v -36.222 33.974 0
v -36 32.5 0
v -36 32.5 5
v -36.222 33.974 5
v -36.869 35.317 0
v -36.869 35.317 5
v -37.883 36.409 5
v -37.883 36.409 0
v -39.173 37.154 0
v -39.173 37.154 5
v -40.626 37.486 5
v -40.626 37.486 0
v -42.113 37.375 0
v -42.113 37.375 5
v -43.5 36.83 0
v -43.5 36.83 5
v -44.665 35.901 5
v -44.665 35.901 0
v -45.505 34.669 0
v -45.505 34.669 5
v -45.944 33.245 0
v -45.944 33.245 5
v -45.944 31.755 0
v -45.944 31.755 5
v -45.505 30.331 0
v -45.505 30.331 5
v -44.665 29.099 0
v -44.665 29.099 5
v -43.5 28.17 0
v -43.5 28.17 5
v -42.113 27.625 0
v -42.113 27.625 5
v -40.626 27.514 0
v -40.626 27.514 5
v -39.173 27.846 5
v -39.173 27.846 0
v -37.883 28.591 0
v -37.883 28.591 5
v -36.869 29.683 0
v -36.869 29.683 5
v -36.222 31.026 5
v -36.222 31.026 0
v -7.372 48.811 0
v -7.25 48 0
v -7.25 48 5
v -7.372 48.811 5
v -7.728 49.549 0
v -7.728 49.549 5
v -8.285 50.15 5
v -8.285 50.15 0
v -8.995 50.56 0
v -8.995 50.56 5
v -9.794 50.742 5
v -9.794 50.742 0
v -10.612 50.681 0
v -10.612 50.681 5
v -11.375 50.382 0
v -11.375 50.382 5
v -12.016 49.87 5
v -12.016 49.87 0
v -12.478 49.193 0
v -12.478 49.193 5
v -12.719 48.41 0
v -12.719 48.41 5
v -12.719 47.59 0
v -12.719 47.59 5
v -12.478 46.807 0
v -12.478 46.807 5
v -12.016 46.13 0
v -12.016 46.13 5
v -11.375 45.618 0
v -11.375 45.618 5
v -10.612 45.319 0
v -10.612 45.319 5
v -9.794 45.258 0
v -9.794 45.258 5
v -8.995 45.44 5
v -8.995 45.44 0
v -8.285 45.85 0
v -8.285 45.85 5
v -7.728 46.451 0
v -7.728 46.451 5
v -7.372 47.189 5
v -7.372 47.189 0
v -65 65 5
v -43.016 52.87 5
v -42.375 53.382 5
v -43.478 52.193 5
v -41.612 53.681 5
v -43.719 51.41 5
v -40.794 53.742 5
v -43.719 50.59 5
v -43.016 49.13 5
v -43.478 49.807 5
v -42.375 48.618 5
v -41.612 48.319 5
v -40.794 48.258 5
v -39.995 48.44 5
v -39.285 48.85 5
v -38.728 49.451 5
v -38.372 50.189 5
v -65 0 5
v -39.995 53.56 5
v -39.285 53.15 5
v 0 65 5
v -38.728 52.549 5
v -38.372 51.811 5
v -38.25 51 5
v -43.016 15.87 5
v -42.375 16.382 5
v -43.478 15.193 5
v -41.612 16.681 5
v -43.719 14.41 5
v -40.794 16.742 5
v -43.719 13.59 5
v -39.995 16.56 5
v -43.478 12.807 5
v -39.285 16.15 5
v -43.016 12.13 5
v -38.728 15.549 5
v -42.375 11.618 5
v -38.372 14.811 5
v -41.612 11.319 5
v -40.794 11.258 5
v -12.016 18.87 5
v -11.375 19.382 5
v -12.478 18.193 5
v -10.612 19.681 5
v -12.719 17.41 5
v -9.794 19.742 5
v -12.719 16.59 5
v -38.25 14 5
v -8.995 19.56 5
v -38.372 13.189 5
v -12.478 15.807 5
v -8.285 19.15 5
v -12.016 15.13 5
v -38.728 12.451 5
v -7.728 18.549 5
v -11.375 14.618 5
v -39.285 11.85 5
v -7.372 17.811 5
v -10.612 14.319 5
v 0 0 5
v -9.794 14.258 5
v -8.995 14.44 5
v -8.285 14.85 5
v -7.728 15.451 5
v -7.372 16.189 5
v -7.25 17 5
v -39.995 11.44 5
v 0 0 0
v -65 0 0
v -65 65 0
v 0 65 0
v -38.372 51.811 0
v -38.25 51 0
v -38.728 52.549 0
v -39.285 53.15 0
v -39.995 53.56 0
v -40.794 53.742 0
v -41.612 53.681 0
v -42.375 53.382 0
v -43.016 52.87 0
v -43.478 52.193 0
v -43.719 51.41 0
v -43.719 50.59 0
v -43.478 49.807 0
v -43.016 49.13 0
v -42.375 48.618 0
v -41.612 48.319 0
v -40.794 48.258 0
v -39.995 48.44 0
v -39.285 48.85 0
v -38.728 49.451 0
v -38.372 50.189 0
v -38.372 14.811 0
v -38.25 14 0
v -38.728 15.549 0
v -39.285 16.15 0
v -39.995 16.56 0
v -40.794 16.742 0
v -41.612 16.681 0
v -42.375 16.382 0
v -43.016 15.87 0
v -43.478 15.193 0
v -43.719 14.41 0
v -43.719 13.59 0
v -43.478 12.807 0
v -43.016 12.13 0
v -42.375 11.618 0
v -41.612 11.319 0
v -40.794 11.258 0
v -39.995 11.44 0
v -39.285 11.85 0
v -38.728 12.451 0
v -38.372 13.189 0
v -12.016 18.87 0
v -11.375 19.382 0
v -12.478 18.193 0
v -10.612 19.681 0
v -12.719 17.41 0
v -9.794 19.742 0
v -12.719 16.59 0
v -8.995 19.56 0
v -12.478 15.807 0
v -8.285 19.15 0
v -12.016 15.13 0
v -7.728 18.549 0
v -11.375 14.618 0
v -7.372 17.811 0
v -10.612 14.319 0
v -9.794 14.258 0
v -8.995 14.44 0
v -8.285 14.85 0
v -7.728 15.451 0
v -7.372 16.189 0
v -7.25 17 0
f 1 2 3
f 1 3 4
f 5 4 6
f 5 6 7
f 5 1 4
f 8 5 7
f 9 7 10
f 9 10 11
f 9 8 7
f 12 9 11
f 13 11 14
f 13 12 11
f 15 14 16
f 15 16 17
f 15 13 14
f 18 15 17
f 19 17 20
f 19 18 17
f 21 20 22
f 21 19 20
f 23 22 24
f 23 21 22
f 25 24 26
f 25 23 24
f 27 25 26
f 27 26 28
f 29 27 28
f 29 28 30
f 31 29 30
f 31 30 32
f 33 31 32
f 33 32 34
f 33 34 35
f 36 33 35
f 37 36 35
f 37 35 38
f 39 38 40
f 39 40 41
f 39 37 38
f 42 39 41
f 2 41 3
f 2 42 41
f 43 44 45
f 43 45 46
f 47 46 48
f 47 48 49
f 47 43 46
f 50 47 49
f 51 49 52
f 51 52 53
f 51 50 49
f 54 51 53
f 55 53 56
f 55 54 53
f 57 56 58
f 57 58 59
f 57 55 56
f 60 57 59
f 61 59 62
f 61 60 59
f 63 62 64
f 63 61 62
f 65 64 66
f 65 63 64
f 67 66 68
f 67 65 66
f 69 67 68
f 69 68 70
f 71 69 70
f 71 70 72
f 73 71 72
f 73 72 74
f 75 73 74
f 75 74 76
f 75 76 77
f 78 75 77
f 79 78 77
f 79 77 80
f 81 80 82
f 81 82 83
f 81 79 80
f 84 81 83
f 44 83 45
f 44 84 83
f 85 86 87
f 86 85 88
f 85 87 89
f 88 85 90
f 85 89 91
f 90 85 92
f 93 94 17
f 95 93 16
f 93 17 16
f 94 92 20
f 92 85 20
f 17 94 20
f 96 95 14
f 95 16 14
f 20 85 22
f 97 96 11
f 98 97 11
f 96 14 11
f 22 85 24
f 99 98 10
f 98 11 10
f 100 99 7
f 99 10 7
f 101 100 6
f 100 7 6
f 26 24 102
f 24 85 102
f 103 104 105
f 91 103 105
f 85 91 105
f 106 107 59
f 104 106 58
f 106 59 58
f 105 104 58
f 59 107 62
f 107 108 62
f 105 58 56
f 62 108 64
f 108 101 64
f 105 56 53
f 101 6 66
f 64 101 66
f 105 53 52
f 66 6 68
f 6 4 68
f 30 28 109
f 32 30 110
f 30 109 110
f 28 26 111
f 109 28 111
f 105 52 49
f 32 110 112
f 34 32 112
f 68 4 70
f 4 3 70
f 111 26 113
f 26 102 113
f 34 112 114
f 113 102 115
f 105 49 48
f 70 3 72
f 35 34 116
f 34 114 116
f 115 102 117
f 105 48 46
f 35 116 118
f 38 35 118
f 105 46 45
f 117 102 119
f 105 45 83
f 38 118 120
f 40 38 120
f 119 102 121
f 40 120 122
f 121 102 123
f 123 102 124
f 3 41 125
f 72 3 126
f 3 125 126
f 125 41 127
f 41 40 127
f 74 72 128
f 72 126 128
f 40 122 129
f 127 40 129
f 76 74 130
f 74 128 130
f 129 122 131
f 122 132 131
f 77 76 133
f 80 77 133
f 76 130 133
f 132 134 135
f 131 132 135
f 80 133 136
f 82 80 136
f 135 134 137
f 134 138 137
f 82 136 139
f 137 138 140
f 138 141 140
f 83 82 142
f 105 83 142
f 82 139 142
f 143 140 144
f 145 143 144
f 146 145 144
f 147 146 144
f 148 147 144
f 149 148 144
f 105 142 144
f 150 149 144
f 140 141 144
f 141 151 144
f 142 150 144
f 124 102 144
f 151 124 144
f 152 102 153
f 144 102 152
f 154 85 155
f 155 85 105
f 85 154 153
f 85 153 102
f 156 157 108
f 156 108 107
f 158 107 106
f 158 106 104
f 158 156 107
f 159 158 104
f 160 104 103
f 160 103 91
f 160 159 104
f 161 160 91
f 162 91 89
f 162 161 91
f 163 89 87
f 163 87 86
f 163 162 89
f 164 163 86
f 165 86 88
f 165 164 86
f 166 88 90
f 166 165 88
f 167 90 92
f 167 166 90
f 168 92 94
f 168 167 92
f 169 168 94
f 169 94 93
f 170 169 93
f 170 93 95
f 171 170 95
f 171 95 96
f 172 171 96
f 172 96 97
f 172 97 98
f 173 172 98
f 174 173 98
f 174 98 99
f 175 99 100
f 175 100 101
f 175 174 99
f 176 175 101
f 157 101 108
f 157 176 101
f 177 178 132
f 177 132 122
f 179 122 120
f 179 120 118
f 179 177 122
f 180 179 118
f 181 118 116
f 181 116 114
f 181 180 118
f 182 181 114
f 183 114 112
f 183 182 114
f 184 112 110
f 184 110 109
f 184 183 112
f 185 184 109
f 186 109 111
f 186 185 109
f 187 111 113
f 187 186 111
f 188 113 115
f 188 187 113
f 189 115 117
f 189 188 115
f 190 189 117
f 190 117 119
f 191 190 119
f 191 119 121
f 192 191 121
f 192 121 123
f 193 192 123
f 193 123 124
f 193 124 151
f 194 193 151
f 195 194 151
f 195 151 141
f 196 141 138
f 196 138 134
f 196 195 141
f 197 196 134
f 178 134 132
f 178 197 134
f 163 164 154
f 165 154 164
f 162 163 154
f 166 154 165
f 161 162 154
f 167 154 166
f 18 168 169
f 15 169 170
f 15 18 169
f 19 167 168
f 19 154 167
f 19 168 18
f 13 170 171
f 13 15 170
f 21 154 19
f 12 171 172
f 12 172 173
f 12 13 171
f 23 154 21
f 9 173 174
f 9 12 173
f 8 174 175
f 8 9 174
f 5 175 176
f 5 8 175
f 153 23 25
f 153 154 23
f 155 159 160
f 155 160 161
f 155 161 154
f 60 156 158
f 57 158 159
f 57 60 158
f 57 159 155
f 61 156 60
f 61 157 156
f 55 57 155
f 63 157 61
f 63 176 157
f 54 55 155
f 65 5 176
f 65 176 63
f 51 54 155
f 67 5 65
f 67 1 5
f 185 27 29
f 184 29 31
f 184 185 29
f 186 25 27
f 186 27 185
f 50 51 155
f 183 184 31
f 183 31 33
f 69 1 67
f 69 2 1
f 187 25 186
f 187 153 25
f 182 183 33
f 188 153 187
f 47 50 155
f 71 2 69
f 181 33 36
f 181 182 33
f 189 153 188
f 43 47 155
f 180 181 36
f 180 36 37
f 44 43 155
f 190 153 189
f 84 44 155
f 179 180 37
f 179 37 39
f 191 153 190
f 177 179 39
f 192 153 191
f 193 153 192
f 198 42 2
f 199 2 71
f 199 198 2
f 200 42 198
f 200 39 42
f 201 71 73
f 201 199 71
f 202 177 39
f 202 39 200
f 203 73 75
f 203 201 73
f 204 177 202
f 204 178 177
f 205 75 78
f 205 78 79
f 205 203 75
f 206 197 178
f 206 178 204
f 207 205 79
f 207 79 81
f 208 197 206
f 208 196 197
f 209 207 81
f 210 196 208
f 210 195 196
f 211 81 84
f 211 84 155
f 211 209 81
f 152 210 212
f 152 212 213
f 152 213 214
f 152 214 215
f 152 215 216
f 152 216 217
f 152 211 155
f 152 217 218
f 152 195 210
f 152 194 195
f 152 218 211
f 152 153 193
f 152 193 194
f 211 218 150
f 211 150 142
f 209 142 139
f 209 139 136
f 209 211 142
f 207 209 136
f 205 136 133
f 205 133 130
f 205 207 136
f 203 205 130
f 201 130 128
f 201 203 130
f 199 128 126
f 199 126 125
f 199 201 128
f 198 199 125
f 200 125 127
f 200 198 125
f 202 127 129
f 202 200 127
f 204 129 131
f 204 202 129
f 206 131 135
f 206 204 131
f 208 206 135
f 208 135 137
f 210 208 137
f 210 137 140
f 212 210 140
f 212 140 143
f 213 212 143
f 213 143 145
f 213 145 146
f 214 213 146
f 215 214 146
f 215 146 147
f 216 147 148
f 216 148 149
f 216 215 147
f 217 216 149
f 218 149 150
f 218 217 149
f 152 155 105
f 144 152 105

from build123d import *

# Parameters (mm, degrees)
F0_W     = 65
F0_H     = 5
F1_DEPTH = 65
F2_R     = 2.75
F2_R_2   = 5
F3_DEPTH = 5


with BuildPart() as f1:
    # F0 (on Front) → F1 (new body)
    with BuildSketch(Plane.XZ):
        with Locations((-32.5, 2.5)):
            Rectangle(F0_W, F0_H)
    extrude(amount=-F1_DEPTH)

    # F2 (on Top) → F3 (cut)
    with BuildSketch(Plane.XY):
        with Locations((-10, 48)):
            Circle(F2_R)
        with Locations((-10, 17)):
            Circle(F2_R)
        with Locations((-41, 51)):
            Circle(F2_R)
        with Locations((-41, 14)):
            Circle(F2_R)
        with Locations((-41, 32.5)):
            Circle(F2_R_2)
    extrude(amount=F3_DEPTH, mode=Mode.SUBTRACT)


solid = f1.part
